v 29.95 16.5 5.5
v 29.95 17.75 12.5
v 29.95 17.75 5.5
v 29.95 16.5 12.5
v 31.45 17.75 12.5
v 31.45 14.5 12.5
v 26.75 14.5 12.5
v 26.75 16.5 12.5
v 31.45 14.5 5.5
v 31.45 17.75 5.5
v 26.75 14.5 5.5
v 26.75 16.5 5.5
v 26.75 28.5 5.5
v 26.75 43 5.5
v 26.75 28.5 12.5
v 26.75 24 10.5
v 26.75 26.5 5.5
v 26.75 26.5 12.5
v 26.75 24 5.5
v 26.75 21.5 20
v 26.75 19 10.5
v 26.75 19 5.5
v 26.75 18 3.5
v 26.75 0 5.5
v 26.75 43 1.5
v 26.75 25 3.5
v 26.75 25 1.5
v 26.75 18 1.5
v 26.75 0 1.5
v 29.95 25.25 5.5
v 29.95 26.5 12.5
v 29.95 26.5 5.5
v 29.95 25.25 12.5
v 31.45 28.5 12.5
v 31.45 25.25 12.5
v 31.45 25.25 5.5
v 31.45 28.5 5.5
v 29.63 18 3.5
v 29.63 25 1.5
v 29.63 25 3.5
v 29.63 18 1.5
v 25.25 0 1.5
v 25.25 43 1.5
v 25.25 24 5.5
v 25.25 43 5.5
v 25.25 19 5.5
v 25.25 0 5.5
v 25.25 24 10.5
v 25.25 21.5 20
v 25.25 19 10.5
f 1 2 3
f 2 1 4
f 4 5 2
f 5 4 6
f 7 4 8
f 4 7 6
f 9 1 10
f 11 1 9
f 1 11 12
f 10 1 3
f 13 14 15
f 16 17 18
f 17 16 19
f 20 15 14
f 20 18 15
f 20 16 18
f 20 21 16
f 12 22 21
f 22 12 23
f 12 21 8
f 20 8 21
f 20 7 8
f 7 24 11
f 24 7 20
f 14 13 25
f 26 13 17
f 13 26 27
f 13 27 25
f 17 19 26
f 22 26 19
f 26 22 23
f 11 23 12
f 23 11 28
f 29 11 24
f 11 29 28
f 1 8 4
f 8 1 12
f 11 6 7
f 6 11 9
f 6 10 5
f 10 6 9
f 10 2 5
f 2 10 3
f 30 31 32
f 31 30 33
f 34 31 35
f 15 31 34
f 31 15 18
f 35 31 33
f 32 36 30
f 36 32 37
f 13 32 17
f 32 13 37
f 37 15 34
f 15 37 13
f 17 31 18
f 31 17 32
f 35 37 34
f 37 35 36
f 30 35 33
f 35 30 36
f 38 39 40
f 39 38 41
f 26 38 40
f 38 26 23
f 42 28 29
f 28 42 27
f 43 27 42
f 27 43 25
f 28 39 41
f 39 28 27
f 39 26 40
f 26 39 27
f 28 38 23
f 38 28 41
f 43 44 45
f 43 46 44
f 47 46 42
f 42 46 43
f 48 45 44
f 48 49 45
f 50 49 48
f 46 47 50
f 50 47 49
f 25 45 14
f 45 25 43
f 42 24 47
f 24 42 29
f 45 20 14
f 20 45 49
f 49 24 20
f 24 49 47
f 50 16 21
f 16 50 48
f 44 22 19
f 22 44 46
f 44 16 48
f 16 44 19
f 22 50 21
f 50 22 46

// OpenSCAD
x_all = 59;
y_all = 43;
z_all = 1.5;
z1_cut = 0.25;

led_x = 10;
led_y = 10;

led_h_z = 3.2;
led_h_x = 7;
led_h_y = 2;
led_x_inner = 5;
led_y_inner = 5;
haken = 1.25;

wand_oben = 0;
wand_dicke = 1.6;
 
//Definiton zusätzlicher Werte für Dachschraege
hoehe = 20;
kniestock = 4;

module led_halter_dach(pos_x, pos_y,pos_z){
    translate([pos_x,pos_y-led_x/2-led_h_y,z_all+pos_z]){
        cube([led_h_z,led_h_y,led_h_x], center=false);
    }
    translate([pos_x+led_h_z,pos_y-led_x/2-led_h_y,z_all+pos_z]){
        cube([z_all,led_h_y+haken,led_h_x], center=false);
    }
    
    translate([pos_x,pos_y+led_y/2,z_all+pos_z]){
        cube([led_h_z,led_h_y,led_h_x], center=false);
    }
    translate([pos_x+led_h_z,pos_y+led_y/2-haken,z_all+pos_z]){
        cube([z_all,led_h_y+haken,led_h_x], center=false);
    }
    translate([pos_x,pos_y-led_h_x/2,z_all]){
        cube([led_h_z*0.9,led_h_x,led_h_y], center=false);
    }
    
}

module DachSchraege(){
    //Berechnung der Startpunkte
    start_x = x_all / 2 - z_all / 2 - led_h_x/2;
    start_y = 0;
    start_z = z_all;
    breite = y_all;
    difference(){
        union(){  
            //Kniestock
            translate([start_x,start_y,start_z]){
                cube([z_all,y_all,kniestock],false);
            }
            
            //Dachschraege
            DachPunkte = [
              [start_x+z_all,0,      start_z+kniestock ],  //0
              [start_x+z_all,y_all,  start_z+kniestock ],  //1
              [start_x,             y_all,  start_z+kniestock ],  //2
              [start_x,             0,      start_z+kniestock ],  //3
              [start_x+z_all,y_all/2,hoehe ],  //4
              [start_x,             y_all/2,hoehe ]]; //5
              
            DachFlaechen = [
              [0,1,2,3],  // bottom
              [4,1,0],  // front
              [4,5,2,1],  // right
              [5,3,2],  // back
              [5,4,0,3]]; // left
              
            polyhedron( DachPunkte, DachFlaechen );
            
            //LED_Halter am Dach
            //Links
            led_halter_dach(start_x+z_all,y_all/2,kniestock);
        }
        
        loch_y = y_all/2 - led_x_inner/2;
        translate([start_x, loch_y, z_all+kniestock]){
            cube([z_all,led_x_inner,led_x_inner],false);
        }
    }   
}

DachSchraege();
